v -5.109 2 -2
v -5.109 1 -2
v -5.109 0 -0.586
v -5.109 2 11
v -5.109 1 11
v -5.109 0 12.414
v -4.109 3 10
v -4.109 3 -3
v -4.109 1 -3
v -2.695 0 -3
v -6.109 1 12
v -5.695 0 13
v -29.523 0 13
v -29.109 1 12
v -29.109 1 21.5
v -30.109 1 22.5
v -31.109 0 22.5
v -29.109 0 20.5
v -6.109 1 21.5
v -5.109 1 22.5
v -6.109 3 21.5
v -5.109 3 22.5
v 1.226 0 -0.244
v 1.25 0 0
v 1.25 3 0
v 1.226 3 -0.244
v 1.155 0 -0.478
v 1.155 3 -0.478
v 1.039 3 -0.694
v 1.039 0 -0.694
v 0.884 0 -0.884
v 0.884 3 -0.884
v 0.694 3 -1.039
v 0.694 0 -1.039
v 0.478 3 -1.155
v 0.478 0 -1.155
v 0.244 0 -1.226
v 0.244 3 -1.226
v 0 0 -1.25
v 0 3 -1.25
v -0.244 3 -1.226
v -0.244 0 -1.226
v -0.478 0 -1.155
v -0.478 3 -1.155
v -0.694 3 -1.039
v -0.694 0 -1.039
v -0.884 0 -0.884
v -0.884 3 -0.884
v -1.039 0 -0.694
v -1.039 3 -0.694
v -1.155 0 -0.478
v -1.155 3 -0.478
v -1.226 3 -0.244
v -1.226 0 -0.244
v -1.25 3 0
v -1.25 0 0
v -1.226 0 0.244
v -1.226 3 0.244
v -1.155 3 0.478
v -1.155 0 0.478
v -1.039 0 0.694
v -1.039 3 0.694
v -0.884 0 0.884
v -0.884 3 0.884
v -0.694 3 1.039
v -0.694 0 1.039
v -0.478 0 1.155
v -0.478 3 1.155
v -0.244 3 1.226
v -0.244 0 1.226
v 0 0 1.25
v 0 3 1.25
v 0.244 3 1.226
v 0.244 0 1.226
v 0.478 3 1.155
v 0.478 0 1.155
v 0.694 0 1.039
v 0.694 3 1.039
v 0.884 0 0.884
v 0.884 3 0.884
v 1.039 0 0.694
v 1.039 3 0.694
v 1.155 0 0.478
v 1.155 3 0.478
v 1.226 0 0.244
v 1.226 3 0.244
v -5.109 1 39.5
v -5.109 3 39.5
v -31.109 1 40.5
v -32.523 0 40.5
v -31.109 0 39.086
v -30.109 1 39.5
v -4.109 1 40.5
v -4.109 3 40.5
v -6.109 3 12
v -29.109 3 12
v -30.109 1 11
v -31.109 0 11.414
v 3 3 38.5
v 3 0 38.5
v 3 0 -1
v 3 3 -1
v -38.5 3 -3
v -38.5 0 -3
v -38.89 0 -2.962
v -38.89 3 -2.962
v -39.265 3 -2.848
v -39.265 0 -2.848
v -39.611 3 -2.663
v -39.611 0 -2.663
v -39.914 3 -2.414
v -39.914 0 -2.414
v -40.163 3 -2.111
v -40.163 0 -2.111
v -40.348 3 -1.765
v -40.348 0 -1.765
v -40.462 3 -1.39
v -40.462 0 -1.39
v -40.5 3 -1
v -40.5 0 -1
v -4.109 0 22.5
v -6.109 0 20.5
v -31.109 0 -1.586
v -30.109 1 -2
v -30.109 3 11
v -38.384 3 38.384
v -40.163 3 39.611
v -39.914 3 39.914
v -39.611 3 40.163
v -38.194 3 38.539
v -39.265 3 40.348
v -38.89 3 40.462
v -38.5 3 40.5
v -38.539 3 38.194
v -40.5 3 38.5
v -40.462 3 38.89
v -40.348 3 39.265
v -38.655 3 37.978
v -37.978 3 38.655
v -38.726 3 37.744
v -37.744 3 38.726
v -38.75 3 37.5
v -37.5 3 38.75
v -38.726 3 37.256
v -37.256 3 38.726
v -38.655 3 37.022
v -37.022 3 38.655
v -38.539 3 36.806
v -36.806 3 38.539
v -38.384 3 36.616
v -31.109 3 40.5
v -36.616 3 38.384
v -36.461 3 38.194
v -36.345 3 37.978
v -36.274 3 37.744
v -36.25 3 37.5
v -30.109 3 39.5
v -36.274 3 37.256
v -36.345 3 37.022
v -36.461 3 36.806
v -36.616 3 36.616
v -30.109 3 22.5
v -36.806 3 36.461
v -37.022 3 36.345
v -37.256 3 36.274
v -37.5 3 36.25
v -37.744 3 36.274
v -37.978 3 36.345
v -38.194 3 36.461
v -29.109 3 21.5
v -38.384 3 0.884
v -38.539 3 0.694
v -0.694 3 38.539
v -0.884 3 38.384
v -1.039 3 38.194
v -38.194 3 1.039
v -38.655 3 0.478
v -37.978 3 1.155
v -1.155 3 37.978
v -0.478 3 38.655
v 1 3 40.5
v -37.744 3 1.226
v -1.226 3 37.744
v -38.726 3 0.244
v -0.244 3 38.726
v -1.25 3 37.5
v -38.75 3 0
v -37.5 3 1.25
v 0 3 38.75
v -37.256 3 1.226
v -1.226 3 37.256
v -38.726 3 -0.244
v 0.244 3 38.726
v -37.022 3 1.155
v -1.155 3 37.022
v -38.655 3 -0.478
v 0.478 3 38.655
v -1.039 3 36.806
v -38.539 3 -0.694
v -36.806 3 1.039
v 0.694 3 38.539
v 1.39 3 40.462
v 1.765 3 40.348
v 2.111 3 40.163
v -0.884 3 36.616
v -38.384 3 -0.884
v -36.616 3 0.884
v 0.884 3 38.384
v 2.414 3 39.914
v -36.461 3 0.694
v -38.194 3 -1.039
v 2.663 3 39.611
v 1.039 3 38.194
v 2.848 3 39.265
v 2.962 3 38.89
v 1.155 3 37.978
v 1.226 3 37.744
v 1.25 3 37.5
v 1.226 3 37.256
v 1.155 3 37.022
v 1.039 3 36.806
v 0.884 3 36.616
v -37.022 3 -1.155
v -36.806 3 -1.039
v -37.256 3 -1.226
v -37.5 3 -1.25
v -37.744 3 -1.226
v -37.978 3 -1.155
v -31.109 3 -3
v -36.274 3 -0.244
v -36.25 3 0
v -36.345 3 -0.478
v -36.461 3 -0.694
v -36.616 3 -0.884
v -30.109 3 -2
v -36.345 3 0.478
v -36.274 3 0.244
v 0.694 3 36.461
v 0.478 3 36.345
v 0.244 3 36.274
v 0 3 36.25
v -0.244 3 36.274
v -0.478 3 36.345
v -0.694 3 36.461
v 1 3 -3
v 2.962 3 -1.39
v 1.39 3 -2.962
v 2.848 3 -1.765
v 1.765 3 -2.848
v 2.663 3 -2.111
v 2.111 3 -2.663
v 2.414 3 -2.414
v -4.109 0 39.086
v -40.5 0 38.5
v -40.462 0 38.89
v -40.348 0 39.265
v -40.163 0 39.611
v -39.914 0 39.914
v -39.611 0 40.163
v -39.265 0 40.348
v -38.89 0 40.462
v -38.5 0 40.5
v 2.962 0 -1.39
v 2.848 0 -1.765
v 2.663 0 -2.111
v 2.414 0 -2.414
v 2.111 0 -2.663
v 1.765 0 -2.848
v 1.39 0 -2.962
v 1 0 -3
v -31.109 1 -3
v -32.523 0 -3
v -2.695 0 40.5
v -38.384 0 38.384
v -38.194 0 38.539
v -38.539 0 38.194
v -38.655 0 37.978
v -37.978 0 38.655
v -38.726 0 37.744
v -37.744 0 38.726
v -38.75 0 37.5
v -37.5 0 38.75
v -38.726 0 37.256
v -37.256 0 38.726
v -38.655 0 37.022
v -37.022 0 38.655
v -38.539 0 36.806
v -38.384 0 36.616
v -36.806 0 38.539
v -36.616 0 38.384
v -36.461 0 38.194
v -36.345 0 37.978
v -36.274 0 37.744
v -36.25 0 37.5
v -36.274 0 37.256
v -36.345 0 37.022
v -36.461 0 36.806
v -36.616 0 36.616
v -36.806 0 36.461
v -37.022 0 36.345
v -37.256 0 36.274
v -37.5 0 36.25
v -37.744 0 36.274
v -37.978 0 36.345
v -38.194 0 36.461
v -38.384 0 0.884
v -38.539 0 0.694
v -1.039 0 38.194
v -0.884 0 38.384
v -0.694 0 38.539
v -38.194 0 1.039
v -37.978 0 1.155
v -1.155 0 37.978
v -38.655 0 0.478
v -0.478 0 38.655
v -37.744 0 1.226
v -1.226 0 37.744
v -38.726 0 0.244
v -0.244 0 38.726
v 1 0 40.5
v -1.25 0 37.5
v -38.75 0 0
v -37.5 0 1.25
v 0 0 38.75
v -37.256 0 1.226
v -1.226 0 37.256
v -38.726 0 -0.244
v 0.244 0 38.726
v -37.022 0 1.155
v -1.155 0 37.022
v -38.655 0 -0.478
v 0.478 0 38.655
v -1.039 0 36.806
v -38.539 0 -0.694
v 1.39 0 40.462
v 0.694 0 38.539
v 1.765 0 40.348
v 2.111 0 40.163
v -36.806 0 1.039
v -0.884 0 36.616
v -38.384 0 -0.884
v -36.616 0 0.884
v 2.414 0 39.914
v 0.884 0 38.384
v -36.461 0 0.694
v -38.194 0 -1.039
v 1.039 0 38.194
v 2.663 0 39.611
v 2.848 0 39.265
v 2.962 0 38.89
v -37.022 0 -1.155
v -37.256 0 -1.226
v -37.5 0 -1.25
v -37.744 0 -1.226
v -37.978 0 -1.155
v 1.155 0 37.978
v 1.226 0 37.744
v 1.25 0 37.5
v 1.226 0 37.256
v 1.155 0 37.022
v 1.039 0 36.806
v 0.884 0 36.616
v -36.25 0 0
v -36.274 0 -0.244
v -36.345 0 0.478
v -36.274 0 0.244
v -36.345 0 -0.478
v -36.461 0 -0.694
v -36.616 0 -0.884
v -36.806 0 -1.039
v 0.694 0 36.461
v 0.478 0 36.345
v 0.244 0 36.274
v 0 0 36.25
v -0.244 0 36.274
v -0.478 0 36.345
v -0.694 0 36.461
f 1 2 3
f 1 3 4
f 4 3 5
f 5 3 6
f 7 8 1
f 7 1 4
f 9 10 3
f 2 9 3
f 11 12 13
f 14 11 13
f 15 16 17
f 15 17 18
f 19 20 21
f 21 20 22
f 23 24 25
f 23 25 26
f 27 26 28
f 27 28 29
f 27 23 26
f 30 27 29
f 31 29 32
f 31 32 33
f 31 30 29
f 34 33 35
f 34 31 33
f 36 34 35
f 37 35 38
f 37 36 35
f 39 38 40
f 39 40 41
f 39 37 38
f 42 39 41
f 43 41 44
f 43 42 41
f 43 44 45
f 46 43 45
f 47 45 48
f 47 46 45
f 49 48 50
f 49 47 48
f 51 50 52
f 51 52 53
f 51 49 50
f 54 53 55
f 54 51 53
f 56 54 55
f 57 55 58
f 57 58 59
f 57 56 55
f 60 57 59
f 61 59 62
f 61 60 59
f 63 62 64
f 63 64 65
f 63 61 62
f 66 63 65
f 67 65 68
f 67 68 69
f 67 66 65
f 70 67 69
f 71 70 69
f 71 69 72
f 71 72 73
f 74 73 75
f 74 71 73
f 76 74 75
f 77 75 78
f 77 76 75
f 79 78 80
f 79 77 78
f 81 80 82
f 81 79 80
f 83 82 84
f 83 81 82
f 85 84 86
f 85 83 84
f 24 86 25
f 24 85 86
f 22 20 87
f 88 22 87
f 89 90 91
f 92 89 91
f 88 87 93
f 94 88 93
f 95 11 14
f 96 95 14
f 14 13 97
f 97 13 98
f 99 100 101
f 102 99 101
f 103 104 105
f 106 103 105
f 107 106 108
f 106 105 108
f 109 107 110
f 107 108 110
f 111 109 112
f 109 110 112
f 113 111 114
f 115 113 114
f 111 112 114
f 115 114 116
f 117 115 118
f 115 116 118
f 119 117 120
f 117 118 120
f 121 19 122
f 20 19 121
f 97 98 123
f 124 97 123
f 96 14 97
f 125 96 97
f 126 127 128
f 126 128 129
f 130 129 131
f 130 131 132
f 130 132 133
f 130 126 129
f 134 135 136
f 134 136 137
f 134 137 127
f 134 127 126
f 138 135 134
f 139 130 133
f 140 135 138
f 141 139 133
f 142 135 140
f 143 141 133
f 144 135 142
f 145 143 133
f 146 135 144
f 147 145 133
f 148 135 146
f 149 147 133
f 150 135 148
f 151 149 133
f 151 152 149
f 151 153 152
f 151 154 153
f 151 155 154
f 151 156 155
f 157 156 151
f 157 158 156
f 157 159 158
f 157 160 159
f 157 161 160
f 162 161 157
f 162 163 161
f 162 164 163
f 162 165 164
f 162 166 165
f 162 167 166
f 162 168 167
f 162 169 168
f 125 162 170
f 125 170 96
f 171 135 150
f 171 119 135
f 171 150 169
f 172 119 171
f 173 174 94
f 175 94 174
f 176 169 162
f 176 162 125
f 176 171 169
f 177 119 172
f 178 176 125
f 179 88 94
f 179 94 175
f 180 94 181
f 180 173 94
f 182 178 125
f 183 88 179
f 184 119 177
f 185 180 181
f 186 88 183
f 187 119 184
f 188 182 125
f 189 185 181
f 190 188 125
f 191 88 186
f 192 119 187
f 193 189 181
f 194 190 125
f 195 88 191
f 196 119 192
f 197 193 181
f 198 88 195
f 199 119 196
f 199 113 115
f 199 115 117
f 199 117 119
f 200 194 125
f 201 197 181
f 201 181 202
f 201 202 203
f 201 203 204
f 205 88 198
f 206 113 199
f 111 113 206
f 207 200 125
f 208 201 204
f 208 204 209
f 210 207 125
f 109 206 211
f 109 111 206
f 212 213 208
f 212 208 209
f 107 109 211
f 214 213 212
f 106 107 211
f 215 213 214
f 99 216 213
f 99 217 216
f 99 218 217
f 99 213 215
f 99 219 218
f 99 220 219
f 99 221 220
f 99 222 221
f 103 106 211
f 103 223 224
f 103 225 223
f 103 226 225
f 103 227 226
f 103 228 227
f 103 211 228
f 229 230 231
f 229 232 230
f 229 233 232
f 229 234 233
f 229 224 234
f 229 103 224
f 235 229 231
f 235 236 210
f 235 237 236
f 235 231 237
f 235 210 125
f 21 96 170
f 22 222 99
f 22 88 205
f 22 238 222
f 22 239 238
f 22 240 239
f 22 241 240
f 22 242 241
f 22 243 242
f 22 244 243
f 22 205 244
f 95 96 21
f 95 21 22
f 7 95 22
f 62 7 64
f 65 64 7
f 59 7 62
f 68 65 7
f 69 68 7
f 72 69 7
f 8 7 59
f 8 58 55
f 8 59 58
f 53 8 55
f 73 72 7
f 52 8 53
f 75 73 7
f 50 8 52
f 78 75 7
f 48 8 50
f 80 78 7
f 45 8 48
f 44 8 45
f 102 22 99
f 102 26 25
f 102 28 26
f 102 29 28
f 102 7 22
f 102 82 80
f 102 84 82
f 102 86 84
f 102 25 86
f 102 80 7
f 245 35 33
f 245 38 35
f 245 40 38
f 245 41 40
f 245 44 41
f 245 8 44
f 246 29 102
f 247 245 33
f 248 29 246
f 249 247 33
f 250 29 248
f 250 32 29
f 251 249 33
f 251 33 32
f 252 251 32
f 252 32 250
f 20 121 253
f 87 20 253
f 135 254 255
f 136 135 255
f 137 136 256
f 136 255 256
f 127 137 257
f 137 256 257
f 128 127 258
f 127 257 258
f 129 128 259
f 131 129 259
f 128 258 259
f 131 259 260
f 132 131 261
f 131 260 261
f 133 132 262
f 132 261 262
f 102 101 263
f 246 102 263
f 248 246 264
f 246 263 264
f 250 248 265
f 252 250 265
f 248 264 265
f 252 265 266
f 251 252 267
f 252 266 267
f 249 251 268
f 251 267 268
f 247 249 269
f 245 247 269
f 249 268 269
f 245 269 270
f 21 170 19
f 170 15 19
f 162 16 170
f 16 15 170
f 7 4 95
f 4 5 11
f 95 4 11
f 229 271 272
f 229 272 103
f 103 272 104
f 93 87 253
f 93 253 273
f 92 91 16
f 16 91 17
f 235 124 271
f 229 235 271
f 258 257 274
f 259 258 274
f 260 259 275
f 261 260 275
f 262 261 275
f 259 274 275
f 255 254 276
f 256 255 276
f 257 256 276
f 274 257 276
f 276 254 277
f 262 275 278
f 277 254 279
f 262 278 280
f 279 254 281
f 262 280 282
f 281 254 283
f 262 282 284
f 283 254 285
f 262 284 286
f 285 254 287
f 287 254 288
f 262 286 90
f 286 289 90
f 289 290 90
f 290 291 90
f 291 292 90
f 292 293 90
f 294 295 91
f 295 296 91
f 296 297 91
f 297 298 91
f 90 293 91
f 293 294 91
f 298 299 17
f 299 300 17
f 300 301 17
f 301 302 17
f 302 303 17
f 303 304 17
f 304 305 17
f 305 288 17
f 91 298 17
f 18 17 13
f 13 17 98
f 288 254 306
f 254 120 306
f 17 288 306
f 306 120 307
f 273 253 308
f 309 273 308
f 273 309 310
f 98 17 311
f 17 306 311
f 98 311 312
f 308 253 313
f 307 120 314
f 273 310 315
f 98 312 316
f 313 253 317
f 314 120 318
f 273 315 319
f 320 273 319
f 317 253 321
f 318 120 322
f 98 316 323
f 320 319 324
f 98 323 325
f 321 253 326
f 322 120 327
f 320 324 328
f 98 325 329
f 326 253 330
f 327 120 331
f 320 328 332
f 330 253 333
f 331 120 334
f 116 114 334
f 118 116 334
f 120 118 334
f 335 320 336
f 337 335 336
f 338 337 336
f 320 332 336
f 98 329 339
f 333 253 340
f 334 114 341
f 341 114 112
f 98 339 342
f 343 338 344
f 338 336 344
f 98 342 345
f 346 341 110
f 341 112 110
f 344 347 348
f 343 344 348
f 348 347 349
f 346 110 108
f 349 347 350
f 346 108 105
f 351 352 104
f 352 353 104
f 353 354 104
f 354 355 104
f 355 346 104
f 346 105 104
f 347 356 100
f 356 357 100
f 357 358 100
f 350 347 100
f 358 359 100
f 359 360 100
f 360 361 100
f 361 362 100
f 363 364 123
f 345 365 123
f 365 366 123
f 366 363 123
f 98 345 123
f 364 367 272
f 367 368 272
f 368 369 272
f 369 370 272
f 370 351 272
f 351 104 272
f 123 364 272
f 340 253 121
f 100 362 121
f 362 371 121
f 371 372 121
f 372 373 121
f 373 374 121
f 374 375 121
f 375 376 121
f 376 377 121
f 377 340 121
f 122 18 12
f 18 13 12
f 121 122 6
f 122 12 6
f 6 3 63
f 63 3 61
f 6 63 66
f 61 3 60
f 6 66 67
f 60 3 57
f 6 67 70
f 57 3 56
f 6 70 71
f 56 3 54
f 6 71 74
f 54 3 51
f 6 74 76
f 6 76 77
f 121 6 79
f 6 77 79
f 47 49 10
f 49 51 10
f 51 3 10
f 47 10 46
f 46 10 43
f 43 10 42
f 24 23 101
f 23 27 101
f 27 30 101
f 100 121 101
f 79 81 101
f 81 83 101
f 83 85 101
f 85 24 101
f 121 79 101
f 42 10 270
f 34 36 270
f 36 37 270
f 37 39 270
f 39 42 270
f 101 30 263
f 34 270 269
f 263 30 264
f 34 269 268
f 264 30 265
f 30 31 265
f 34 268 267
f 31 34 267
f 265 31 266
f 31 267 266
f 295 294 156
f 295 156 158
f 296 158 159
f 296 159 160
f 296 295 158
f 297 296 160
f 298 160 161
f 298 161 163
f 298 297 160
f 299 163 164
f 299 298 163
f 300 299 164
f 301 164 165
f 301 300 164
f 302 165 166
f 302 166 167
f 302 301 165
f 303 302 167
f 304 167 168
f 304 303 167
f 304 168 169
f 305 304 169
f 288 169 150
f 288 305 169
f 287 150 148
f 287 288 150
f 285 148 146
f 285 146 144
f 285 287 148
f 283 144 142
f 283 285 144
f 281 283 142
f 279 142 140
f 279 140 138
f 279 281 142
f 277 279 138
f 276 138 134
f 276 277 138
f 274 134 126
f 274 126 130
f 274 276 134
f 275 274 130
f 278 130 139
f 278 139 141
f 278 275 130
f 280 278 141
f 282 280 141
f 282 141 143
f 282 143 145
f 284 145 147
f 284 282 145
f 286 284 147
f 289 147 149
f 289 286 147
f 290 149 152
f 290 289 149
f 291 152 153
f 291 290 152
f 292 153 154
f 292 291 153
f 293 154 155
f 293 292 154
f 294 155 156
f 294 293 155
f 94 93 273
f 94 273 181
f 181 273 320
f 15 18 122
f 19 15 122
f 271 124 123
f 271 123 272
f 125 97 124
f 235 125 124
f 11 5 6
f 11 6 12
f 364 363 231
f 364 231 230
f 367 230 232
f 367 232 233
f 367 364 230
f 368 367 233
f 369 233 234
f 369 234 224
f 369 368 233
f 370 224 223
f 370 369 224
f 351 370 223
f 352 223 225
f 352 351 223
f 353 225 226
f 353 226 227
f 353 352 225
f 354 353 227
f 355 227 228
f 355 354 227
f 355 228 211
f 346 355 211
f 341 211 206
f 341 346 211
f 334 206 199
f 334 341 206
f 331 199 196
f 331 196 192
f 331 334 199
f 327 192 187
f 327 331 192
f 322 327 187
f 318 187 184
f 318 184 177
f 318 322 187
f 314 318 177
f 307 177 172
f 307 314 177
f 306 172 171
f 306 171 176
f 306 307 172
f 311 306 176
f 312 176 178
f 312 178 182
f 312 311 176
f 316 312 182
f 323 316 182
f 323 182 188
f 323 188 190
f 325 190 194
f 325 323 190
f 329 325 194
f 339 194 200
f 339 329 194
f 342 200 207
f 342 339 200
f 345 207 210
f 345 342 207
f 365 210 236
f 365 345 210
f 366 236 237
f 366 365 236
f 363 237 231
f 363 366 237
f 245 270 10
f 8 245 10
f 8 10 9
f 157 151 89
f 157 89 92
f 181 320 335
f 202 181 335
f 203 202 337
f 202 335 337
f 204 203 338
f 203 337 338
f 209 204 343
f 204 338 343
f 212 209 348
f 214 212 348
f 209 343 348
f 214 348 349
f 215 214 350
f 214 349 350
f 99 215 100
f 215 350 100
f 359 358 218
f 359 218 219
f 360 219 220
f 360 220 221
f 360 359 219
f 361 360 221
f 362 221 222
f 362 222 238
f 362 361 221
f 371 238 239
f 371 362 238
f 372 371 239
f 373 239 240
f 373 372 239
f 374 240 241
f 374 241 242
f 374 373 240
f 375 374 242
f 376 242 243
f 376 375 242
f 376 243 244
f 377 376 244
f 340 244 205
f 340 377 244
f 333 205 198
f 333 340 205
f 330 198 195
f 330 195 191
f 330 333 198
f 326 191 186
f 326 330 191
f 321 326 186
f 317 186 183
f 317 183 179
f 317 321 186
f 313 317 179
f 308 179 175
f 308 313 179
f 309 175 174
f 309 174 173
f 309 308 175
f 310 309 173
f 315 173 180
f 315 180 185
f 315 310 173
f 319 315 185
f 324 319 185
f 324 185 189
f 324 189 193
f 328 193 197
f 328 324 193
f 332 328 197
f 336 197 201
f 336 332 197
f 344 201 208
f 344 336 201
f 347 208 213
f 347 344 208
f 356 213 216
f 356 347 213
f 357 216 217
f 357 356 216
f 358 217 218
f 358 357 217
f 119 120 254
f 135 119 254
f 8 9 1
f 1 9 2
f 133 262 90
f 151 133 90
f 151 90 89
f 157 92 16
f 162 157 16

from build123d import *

# Parameters (mm, degrees)
CROQUIS1_R              = 1.25
SALIENTE_EXTRUIR1_DEPTH = 3
CHAFL_N1_SIZE           = 1


with BuildPart() as part:
    # Croquis1 → Saliente-Extruir1 (new body)
    with BuildSketch(Plane(origin=(0, 0, 0), x_dir=(1, 0, 0), z_dir=(0, 1, 0))):
        with BuildLine():
            Line((-31.108771954, -40.5), (-30.108771954, -39.5))
            Line((-30.108771954, -39.5), (-30.108771954, -21.5))
            Line((-30.108771954, -21.5), (-5.108771954, -21.5))
            Line((-5.108771954, -21.5), (-5.108771954, -39.5))
            Line((-5.108771954, -39.5), (-4.108771954, -40.5))
            Line((-4.108771954, -40.5), (1, -40.5))
            ThreePointArc((1, -40.5), (2.414213562, -39.914213562), (3, -38.5))
            Line((3, -38.5), (3, 1))
            ThreePointArc((3, 1), (2.414213562, 2.414213562), (1, 3))
            Line((1, 3), (-4.108771954, 3))
            Line((-4.108771954, 3), (-5.108771954, 2))
            Line((-5.108771954, 2), (-5.108771954, -11))
            Line((-5.108771954, -11), (-6.108771954, -12))
            Line((-6.108771954, -12), (-29.108771954, -12))
            Line((-29.108771954, -12), (-30.108771954, -11))
            Line((-30.108771954, -11), (-30.108771954, 2))
            Line((-30.108771954, 2), (-31.108771954, 3))
            Line((-31.108771954, 3), (-38.5, 3))
            ThreePointArc((-38.5, 3), (-39.914213562, 2.414213562), (-40.5, 1))
            Line((-40.5, 1), (-40.5, -38.5))
            ThreePointArc((-40.5, -38.5), (-39.914213562, -39.914213562), (-38.5, -40.5))
            Line((-38.5, -40.5), (-31.108771954, -40.5))
        make_face()
        with Locations((-37.5, -37.5)):
            Circle(CROQUIS1_R, mode=Mode.SUBTRACT)
        with Locations((-37.5, 0)):
            Circle(CROQUIS1_R, mode=Mode.SUBTRACT)
        with Locations((0, -37.5)):
            Circle(CROQUIS1_R, mode=Mode.SUBTRACT)
        Circle(CROQUIS1_R, mode=Mode.SUBTRACT)
    extrude(amount=SALIENTE_EXTRUIR1_DEPTH)

    # Chaflán1
    chafl_n1_edges = [part.edges().sort_by_distance(p)[0] for p in [
        (-4.608771954, 0, 40),
        (-30.608771954, 0, 40),
        (-4.608771954, 0, -2.5),
        (-5.108771954, 3, 4.5),
        (-30.608771954, 0, -2.5),
        (-5.608771954, 0, 11.5),
        (-30.108771954, 0, 4.5),
        (-29.608771954, 0, 11.5),
        (-17.608771954, 0, 12),
        (-5.108771954, 0, 30.5),
        (-30.108771954, 0, 30.5),
        (-5.108771954, 1.5, 21.5),
        (-17.608771954, 0, 21.5),
        (-30.108771954, 1.5, 21.5),
    ]]
    chamfer(chafl_n1_edges, length=CHAFL_N1_SIZE)


solid = part.part
